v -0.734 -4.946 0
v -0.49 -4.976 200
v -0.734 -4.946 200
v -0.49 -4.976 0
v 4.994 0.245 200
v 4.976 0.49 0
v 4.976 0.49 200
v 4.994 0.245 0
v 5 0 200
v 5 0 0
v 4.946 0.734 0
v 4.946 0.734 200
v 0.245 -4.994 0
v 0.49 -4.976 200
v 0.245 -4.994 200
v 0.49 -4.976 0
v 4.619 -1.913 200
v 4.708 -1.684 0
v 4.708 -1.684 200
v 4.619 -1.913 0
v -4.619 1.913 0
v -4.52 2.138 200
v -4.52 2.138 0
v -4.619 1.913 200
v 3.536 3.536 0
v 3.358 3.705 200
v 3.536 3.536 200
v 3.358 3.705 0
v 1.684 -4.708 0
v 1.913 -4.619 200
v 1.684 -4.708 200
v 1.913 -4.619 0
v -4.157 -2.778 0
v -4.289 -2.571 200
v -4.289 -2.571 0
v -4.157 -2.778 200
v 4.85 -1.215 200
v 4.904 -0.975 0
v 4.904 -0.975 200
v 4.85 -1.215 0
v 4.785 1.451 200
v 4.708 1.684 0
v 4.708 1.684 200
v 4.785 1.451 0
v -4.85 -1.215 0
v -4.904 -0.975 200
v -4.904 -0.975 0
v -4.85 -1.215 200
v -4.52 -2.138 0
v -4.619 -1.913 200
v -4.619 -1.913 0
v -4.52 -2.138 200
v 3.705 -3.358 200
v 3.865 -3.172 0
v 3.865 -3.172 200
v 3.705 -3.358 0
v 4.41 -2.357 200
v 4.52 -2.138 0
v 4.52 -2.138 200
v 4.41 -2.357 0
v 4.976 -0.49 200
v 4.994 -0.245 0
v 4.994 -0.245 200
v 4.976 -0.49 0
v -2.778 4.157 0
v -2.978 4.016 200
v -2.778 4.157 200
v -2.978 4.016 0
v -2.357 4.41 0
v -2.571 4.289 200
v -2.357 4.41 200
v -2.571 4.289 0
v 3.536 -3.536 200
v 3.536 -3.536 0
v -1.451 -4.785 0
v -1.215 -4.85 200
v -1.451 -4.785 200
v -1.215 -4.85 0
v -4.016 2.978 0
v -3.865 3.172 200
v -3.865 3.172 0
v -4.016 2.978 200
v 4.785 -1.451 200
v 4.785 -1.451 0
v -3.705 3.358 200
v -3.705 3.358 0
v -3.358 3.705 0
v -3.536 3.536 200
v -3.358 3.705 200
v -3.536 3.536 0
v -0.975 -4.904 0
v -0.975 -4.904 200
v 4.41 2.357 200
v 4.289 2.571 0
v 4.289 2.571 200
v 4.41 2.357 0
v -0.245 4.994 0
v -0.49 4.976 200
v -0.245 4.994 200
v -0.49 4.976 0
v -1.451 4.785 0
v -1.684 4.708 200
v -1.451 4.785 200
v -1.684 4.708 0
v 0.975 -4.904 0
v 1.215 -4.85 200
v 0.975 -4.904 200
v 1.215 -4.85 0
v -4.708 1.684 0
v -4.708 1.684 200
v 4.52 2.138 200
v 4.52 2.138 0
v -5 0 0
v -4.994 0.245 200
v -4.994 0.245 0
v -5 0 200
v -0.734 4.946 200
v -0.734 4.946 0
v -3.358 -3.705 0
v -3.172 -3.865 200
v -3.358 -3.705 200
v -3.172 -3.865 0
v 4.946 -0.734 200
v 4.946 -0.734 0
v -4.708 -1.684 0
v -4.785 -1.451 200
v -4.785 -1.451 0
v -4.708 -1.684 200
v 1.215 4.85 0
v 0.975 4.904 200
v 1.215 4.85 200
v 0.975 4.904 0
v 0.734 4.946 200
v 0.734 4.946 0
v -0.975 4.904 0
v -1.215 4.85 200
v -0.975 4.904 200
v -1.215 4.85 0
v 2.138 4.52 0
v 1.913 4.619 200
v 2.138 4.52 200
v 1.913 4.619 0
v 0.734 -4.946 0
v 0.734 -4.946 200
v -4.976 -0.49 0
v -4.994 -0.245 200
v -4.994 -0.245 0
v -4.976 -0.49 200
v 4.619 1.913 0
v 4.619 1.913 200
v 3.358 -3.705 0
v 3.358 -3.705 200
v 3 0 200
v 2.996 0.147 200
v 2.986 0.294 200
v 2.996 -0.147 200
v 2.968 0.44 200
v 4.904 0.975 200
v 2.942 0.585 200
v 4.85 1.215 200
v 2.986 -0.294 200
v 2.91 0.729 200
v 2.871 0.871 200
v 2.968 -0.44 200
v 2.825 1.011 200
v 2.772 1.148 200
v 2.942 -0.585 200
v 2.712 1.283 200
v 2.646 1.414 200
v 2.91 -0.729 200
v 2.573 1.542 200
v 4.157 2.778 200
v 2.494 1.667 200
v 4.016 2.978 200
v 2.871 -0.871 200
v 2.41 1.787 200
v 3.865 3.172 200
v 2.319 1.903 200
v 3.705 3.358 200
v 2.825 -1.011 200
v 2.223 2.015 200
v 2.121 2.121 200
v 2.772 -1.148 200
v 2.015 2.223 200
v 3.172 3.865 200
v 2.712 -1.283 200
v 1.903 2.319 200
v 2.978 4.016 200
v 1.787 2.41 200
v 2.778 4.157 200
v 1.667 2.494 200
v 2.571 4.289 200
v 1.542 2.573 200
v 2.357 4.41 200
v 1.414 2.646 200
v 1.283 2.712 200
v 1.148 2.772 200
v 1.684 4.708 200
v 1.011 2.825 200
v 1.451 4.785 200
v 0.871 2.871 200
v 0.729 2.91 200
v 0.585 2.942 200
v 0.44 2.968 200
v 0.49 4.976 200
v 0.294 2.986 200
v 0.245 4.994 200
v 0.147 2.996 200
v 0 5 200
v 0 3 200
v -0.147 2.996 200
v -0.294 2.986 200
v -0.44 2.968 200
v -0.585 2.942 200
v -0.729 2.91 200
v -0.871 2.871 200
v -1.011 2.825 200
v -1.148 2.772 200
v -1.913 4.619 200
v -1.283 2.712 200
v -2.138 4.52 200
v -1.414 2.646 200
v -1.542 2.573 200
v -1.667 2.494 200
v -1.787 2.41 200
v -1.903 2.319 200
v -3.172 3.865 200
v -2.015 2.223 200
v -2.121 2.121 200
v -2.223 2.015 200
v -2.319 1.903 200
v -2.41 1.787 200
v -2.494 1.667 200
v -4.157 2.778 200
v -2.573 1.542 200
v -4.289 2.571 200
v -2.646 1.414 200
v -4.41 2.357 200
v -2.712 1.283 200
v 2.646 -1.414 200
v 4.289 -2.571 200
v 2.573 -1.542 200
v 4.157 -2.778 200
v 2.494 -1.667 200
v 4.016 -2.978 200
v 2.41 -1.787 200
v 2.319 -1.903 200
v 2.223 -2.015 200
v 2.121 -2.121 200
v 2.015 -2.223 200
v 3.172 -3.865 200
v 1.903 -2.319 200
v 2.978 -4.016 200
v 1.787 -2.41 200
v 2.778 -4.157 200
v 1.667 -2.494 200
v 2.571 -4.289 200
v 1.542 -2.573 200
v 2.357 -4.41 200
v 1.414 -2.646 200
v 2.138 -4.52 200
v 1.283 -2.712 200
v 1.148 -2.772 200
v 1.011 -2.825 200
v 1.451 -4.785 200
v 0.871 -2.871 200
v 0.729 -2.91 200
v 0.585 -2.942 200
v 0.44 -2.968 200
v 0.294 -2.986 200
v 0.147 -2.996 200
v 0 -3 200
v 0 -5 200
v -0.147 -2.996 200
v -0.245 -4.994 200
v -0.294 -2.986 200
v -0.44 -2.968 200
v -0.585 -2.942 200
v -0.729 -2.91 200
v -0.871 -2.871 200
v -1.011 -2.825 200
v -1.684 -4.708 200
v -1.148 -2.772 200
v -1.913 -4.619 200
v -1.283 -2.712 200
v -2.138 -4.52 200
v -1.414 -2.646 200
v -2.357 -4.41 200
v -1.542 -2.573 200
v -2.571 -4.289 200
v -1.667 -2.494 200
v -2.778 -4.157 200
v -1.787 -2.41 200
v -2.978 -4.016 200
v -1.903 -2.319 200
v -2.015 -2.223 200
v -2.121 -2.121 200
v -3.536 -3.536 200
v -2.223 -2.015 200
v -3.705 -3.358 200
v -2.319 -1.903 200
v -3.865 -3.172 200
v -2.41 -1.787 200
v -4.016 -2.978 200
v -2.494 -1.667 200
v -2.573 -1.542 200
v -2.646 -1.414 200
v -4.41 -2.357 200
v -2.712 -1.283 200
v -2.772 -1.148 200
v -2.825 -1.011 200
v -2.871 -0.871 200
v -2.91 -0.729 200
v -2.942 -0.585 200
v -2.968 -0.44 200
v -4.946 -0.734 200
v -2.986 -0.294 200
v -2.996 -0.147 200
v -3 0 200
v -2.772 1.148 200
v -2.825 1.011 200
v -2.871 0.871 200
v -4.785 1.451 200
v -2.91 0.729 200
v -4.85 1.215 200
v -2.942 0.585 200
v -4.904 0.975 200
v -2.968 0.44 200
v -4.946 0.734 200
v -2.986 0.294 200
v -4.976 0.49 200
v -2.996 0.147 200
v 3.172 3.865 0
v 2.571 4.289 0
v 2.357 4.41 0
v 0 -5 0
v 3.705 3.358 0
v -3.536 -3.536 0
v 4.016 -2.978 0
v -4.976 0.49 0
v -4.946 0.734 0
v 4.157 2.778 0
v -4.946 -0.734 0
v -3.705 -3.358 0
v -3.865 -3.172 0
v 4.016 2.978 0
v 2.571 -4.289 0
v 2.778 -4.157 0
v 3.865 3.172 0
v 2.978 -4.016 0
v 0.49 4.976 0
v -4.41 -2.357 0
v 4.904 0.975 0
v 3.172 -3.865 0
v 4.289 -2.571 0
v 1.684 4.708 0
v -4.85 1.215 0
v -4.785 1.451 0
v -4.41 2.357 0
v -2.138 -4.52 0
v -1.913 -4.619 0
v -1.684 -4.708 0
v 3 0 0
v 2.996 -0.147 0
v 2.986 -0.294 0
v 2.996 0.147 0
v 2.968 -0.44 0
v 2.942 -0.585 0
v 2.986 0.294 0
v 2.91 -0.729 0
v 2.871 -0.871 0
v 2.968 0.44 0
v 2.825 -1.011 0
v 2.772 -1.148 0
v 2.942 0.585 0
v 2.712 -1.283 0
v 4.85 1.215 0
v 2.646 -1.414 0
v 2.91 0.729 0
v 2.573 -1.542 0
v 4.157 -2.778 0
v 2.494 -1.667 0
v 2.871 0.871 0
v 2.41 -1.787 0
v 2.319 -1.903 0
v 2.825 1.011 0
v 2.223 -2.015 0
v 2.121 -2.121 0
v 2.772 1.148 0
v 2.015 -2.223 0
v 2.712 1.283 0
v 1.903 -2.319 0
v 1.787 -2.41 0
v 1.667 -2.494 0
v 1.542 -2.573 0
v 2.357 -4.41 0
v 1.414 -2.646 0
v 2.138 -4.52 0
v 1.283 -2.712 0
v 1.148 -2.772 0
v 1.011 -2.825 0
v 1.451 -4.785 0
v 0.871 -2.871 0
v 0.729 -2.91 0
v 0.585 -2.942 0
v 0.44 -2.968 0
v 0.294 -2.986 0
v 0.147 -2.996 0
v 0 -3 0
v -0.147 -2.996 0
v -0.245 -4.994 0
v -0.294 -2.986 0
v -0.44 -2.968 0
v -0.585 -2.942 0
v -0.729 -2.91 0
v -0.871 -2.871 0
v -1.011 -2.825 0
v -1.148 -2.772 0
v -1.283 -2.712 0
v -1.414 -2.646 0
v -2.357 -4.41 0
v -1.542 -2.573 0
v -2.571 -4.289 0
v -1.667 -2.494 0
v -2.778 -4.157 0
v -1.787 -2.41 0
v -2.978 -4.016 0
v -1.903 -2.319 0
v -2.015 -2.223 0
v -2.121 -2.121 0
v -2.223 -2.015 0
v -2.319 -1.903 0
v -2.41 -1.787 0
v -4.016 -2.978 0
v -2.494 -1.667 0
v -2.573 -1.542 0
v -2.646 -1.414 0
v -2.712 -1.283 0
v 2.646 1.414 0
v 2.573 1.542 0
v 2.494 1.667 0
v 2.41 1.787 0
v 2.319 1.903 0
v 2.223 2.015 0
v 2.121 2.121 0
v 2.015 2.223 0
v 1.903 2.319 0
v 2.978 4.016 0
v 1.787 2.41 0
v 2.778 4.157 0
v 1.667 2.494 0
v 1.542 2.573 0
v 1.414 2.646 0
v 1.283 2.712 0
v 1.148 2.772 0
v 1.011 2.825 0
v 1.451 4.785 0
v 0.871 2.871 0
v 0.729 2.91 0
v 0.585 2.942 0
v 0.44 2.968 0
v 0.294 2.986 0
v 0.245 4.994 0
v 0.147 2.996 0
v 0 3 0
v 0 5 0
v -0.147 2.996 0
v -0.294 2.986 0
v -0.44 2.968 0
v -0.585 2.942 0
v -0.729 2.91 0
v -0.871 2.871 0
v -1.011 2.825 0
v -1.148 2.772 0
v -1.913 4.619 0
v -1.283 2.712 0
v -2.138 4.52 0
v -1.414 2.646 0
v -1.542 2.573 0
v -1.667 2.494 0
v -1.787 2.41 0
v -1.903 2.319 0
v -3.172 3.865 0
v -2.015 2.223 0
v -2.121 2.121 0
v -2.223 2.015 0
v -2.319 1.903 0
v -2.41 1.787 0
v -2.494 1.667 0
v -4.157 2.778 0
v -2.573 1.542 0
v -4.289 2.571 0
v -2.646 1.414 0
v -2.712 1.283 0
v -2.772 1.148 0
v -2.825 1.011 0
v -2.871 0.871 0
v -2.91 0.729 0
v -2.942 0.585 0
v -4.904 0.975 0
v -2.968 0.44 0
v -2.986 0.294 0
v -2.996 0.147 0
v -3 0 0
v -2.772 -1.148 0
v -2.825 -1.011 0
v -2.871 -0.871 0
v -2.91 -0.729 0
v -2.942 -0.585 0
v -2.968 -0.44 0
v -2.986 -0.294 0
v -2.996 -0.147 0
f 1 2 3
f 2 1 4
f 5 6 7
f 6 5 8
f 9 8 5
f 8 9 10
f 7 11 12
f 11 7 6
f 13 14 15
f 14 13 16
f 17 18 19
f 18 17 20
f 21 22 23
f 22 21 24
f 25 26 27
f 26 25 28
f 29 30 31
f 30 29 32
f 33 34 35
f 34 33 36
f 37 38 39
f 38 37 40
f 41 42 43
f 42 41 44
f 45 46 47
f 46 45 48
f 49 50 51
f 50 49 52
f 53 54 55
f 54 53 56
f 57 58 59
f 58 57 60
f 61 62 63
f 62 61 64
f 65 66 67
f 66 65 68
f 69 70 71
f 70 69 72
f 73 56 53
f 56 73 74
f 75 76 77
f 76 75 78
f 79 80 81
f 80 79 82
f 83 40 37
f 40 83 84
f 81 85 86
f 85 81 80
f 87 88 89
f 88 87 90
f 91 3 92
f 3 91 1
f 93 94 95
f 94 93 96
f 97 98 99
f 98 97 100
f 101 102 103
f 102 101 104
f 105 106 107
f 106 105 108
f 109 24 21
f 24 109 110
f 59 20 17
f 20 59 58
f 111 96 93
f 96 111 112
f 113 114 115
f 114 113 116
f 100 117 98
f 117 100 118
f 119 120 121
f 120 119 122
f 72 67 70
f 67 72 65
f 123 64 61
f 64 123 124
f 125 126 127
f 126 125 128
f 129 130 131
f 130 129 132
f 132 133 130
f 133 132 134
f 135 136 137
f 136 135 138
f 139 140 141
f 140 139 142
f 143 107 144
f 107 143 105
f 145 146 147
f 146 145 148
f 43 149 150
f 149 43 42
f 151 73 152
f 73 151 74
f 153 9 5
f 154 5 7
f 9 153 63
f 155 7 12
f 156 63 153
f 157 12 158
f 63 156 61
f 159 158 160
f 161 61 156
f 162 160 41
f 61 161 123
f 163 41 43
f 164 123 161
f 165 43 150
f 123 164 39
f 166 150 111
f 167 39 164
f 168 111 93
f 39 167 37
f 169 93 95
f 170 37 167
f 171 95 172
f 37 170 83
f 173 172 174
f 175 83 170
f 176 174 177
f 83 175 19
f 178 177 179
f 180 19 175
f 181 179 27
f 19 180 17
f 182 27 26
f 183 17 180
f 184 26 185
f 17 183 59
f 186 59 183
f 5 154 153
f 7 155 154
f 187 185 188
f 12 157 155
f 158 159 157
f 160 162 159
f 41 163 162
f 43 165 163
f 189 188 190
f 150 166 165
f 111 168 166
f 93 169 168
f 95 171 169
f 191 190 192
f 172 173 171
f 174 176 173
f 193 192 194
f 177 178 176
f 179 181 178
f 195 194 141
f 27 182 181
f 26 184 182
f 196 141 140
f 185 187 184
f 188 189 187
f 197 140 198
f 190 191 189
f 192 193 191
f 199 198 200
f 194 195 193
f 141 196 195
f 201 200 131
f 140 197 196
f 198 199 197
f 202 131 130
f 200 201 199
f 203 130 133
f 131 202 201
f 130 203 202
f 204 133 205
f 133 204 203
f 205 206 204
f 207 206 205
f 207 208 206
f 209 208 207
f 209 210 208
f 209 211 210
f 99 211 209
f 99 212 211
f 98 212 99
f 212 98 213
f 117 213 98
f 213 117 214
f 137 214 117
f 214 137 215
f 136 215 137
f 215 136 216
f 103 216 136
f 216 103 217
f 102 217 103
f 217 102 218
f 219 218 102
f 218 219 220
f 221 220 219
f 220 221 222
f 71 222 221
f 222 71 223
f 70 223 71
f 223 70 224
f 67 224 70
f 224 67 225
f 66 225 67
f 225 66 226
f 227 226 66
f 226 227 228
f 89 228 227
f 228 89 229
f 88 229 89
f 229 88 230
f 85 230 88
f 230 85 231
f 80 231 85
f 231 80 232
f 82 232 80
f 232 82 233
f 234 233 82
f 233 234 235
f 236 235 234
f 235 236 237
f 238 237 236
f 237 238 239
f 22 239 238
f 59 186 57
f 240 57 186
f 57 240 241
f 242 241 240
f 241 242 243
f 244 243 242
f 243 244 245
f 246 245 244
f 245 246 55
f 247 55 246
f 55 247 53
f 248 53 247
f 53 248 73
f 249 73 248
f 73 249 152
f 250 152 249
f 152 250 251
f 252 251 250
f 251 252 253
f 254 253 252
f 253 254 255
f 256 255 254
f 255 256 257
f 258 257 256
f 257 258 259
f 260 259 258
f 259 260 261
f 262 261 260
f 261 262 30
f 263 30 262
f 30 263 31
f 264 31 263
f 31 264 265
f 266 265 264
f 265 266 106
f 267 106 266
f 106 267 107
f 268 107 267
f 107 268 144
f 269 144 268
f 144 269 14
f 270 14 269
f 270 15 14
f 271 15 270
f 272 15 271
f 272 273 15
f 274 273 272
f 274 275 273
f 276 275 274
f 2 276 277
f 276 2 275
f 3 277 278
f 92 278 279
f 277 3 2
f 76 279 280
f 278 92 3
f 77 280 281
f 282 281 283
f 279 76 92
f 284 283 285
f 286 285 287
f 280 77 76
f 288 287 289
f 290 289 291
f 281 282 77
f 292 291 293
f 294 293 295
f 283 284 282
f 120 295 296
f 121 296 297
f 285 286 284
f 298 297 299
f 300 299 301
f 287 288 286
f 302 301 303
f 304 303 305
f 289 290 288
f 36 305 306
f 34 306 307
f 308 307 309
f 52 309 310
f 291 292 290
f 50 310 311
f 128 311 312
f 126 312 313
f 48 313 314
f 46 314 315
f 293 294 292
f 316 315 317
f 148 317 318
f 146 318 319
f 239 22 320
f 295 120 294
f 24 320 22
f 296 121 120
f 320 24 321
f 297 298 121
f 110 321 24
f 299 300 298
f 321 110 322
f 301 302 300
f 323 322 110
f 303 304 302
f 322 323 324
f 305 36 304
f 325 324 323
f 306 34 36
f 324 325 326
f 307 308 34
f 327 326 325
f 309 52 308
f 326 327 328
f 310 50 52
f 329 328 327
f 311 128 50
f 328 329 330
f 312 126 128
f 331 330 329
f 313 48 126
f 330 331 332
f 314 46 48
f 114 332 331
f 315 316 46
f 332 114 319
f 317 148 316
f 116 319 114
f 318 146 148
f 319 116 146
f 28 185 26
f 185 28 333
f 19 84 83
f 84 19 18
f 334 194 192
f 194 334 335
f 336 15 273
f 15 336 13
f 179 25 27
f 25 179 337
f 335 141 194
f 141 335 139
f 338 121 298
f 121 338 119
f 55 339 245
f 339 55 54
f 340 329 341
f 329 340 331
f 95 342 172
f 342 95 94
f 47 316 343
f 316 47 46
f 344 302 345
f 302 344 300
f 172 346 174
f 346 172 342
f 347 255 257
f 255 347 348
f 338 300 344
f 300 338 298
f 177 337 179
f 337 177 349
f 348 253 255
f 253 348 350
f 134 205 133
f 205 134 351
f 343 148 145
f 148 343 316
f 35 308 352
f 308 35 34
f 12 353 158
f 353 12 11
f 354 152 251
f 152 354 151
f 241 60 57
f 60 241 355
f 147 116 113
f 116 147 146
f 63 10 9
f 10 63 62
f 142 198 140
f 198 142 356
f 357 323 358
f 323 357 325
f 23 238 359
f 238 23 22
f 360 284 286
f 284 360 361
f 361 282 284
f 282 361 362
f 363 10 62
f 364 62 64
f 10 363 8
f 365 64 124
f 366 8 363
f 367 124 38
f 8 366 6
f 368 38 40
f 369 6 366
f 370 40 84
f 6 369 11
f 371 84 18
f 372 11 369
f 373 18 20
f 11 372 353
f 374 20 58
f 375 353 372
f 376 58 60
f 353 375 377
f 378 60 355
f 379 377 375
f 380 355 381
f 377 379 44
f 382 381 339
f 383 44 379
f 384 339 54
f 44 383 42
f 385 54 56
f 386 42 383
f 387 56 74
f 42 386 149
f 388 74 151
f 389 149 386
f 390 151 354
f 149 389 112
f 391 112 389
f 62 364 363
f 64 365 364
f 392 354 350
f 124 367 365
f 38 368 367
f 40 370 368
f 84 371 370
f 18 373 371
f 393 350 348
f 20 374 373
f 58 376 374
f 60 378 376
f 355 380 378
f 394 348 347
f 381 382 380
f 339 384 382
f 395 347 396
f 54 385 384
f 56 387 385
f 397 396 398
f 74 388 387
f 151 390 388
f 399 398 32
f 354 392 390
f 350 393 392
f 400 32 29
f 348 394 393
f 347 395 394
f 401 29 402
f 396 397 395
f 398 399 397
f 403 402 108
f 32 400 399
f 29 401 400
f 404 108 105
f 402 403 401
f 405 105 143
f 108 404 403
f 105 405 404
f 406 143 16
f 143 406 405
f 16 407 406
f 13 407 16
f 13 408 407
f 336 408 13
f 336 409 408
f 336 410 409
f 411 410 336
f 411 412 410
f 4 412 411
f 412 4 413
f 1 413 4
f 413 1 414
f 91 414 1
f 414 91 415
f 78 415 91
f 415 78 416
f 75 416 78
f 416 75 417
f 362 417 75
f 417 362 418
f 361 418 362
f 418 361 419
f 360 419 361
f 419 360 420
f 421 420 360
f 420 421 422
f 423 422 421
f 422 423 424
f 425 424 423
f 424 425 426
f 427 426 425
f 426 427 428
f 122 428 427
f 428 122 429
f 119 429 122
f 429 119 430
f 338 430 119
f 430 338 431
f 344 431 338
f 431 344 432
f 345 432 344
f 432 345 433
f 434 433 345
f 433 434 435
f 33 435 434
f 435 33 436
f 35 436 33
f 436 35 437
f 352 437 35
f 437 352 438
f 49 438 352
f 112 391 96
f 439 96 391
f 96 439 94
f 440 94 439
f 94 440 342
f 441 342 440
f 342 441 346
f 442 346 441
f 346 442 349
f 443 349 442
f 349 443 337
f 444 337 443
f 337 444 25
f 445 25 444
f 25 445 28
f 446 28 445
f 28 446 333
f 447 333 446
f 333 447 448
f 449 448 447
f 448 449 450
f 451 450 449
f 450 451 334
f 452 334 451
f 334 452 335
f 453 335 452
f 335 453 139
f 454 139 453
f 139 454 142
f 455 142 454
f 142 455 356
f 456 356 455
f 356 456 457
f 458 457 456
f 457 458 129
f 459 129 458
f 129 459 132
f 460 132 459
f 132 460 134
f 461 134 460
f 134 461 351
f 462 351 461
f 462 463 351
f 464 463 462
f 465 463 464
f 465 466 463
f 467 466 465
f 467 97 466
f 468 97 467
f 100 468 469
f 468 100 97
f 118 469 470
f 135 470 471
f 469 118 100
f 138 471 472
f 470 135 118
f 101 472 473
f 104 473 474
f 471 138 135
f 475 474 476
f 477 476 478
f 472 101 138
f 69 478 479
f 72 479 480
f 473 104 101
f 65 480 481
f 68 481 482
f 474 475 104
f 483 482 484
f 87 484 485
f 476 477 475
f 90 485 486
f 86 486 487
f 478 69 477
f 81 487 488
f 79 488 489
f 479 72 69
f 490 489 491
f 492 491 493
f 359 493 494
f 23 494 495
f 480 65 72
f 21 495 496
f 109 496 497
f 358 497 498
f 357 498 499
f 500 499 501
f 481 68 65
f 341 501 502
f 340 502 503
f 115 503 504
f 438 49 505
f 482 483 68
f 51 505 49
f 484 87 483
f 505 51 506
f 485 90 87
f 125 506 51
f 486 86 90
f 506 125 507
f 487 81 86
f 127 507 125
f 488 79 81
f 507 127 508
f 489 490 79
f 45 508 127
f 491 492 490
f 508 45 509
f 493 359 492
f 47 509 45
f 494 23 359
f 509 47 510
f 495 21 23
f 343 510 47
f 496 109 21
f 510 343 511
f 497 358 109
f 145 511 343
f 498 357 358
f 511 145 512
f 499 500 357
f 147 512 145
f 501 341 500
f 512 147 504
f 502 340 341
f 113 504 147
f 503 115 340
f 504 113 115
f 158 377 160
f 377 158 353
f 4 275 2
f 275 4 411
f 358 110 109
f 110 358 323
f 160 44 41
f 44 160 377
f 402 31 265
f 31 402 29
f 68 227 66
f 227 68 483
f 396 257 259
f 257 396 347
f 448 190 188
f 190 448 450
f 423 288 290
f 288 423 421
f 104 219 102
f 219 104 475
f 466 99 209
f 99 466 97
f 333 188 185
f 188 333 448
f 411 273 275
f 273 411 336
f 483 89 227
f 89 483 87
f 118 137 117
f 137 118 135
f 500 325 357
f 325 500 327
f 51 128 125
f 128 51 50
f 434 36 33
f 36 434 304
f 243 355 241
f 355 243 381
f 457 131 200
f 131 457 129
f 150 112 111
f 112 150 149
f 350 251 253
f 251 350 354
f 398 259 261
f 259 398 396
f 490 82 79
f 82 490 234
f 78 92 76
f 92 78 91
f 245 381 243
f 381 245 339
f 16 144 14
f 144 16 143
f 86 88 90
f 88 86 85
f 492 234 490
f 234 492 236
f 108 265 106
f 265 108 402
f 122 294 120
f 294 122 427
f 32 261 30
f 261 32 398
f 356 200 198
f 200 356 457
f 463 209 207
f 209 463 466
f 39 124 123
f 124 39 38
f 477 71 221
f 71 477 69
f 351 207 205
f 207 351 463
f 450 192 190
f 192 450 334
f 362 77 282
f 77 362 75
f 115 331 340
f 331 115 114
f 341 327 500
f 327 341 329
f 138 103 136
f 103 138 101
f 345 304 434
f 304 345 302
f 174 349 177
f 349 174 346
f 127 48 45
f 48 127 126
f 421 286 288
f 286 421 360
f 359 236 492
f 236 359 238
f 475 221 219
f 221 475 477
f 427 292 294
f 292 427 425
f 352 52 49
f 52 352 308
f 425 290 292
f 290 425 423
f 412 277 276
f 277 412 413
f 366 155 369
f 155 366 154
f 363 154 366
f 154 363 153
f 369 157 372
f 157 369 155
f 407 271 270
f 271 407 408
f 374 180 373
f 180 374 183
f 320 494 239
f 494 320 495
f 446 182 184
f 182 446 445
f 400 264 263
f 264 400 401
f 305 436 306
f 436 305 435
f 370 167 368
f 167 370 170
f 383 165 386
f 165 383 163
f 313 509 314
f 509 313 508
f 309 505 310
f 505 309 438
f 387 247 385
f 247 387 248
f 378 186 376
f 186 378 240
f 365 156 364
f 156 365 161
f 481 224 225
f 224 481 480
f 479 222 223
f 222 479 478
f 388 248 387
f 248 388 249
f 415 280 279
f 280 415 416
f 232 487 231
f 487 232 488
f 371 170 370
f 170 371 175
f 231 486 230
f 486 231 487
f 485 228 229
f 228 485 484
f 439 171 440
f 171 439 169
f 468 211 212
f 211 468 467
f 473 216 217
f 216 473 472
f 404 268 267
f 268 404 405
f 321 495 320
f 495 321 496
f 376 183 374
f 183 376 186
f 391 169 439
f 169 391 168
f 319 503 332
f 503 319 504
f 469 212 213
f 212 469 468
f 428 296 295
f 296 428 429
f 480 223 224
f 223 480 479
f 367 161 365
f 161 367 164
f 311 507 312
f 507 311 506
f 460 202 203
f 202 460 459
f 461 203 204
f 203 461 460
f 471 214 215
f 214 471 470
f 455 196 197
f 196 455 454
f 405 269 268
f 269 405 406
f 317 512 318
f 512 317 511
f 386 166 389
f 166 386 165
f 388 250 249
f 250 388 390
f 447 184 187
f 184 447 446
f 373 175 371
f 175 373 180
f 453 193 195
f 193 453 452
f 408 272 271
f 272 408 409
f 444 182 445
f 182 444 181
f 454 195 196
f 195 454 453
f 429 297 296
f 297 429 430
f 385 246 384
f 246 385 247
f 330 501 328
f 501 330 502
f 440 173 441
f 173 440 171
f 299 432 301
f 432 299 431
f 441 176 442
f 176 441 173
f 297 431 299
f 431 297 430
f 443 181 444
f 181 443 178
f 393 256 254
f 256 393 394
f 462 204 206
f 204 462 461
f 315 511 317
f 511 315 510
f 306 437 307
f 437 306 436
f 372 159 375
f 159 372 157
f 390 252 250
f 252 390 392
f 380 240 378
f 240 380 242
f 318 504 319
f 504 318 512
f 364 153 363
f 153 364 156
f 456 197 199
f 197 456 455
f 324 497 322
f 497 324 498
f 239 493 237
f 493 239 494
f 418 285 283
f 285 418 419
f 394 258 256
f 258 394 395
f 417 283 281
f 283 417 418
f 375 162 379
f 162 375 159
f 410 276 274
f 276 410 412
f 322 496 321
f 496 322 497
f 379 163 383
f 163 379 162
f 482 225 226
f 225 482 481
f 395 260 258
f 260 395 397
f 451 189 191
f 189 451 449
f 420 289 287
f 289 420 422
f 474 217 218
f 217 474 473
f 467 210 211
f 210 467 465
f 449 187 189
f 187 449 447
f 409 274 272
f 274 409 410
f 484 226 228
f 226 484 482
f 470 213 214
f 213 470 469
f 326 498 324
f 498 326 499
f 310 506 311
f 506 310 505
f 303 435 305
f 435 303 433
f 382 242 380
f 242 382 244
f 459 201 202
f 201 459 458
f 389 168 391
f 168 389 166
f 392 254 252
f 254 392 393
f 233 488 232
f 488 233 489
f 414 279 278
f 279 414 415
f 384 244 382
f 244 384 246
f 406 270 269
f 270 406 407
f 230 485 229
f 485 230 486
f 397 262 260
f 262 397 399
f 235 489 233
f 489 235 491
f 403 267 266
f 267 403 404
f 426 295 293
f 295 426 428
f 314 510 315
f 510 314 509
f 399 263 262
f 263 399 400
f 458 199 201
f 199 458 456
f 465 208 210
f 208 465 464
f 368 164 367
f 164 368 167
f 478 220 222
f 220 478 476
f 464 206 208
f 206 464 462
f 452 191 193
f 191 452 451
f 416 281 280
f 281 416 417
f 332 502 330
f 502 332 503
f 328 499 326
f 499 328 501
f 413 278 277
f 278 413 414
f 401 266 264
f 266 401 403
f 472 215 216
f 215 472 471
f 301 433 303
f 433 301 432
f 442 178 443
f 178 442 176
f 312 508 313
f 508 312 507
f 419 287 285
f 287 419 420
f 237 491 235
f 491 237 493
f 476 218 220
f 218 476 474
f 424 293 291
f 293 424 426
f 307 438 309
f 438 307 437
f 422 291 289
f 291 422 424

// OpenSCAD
$fn = 128;

// PVC aquarium tubing (hollow flexible tube)
inner_d = 6;          // mm
outer_d = 10;         // mm
length  = 200;        // mm

module tubing(od, id, h) {
    difference() {
        cylinder(h = h, d = od);
        translate([0,0,-0.5])
            cylinder(h = h + 1, d = id);
    }
}

tubing(outer_d, inner_d, length);
